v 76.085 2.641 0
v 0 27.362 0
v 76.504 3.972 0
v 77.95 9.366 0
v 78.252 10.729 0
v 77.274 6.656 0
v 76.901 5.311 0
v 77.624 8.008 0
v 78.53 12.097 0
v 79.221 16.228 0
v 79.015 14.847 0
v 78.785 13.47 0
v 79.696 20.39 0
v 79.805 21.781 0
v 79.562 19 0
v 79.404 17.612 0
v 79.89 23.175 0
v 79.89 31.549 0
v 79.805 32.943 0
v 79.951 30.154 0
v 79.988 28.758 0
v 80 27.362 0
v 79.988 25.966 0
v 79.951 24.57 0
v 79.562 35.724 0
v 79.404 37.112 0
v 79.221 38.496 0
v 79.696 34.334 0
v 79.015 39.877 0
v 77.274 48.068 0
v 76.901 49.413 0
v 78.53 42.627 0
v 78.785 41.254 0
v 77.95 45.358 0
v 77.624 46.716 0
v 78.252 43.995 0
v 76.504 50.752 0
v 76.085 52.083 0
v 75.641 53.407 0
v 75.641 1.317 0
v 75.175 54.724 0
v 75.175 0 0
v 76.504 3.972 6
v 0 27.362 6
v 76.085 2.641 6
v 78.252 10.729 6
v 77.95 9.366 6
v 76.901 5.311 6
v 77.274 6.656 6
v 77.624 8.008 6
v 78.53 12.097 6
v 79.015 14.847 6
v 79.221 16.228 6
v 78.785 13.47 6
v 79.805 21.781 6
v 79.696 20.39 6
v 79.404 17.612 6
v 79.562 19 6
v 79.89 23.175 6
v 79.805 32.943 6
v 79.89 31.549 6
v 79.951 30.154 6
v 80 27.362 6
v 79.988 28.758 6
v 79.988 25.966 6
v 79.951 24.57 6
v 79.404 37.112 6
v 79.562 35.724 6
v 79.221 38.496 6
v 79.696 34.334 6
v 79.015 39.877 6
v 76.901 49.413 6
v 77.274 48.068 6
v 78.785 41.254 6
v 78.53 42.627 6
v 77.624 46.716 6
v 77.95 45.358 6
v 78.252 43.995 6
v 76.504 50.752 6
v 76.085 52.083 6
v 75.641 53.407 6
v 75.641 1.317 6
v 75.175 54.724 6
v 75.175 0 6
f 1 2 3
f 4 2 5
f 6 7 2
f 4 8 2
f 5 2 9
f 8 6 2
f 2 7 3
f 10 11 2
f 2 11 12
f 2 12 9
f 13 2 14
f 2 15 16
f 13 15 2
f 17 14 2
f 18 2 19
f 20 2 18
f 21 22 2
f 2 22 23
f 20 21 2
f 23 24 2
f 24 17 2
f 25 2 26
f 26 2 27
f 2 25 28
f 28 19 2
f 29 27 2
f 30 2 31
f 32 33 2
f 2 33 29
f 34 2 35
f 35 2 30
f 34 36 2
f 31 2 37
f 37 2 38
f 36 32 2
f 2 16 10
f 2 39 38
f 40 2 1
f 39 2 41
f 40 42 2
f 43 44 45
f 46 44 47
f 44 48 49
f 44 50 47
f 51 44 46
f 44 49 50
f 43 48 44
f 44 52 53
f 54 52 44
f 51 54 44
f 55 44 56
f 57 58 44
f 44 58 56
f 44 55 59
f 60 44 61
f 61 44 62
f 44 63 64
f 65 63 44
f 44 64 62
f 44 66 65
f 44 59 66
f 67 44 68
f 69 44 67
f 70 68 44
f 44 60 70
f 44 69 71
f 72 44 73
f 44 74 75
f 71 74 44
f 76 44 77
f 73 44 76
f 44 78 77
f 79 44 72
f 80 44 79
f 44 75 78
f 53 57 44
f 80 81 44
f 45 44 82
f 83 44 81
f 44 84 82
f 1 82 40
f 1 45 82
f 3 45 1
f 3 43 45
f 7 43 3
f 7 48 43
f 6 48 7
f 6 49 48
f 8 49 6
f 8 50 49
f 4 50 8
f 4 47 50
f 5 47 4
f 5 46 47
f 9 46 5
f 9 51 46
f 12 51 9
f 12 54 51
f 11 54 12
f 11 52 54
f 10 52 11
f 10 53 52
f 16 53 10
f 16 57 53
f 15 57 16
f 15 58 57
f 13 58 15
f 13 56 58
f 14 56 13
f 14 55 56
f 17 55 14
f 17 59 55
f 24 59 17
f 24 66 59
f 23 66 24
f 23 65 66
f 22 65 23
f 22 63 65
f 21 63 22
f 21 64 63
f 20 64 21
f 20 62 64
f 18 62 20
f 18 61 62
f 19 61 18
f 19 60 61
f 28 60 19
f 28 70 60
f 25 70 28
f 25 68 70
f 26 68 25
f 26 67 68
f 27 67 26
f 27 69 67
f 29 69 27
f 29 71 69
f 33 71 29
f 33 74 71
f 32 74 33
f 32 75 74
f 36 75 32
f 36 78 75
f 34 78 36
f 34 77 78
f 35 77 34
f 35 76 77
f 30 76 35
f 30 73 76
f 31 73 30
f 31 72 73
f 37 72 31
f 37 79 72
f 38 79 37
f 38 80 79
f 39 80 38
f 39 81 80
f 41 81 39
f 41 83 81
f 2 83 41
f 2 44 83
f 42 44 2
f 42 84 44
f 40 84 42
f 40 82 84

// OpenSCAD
$fn = 32;

// ----------------------------------------------------------------------
// Arc profile plate: sector, 42 points
// ----------------------------------------------------------------------

// --- parameters (mm) ---
sector_angle = 40;        // sector angle, degrees
sector_r = 80;            // outer radius
arc_step = 1;             // sampling step of the arc, degrees
plate_t = 6;              // plate thickness, Z

bbox_x = 2 * sector_r * sin(sector_angle / 2);  // chord of the sector
bbox_y = sector_r;  // depth of the sector (apex to arc)

profile = [[75.175, 0], [75.641, 1.317], [76.085, 2.641], [76.504, 3.972], [76.901, 5.311], [77.274, 6.656], [77.624, 8.008], [77.95, 9.366], [78.252, 10.729], [78.53, 12.097], [78.785, 13.47], [79.015, 14.847], [79.221, 16.228], [79.404, 17.612], [79.562, 19], [79.696, 20.39], [79.805, 21.781], [79.89, 23.175], [79.951, 24.57], [79.988, 25.966], [80, 27.362], [79.988, 28.758], [79.951, 30.154], [79.89, 31.549], [79.805, 32.943], [79.696, 34.334], [79.562, 35.724], [79.404, 37.112], [79.221, 38.496], [79.015, 39.877], [78.785, 41.254], [78.53, 42.627], [78.252, 43.995], [77.95, 45.358], [77.624, 46.716], [77.274, 48.068], [76.901, 49.413], [76.504, 50.752], [76.085, 52.083], [75.641, 53.407], [75.175, 54.724], [0, 27.362]];  // primary outline, 42 points, counter clockwise

// --- the one profile operation ---
linear_extrude(height = plate_t) polygon(points = profile);
